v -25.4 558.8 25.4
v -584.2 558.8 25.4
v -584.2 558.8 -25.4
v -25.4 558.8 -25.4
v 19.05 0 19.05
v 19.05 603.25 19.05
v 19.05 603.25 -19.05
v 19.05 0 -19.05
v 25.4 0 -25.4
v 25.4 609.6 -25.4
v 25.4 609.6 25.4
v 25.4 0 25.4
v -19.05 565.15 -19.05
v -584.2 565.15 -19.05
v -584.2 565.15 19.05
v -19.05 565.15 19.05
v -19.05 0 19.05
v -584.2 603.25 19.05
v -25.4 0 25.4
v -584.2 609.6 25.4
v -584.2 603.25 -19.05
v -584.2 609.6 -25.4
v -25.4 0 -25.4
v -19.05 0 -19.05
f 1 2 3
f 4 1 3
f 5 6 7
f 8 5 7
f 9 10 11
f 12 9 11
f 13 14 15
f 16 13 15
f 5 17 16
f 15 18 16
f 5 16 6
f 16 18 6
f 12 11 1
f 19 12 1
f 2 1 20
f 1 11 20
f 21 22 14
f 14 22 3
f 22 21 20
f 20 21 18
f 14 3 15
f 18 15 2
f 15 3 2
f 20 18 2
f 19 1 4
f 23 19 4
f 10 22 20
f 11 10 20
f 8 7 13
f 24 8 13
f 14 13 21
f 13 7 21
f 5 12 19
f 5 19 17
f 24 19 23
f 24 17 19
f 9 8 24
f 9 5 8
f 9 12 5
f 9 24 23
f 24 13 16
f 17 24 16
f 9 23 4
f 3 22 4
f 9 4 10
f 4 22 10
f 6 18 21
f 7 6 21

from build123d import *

# Parameters (mm, degrees)
F1_W   = 50.8
F1_H   = 50.8
F1_W_2 = 38.1
F1_H_2 = 38.1


with BuildPart() as f2:
    # F2: sweep along a path in F0
    with BuildLine(Plane.XY) as f2_path:
        Line((0, 0), (0, 584.2))
        Line((0, 584.2), (-584.2, 584.2))
    # F1 (on Front) → F2 (sweep)
    with BuildSketch(Plane.XZ):
        Rectangle(F1_W, F1_H)
        Rectangle(F1_W_2, F1_H_2, mode=Mode.SUBTRACT)
    sweep(path=f2_path.line, transition=Transition.RIGHT)


solid = f2.part
